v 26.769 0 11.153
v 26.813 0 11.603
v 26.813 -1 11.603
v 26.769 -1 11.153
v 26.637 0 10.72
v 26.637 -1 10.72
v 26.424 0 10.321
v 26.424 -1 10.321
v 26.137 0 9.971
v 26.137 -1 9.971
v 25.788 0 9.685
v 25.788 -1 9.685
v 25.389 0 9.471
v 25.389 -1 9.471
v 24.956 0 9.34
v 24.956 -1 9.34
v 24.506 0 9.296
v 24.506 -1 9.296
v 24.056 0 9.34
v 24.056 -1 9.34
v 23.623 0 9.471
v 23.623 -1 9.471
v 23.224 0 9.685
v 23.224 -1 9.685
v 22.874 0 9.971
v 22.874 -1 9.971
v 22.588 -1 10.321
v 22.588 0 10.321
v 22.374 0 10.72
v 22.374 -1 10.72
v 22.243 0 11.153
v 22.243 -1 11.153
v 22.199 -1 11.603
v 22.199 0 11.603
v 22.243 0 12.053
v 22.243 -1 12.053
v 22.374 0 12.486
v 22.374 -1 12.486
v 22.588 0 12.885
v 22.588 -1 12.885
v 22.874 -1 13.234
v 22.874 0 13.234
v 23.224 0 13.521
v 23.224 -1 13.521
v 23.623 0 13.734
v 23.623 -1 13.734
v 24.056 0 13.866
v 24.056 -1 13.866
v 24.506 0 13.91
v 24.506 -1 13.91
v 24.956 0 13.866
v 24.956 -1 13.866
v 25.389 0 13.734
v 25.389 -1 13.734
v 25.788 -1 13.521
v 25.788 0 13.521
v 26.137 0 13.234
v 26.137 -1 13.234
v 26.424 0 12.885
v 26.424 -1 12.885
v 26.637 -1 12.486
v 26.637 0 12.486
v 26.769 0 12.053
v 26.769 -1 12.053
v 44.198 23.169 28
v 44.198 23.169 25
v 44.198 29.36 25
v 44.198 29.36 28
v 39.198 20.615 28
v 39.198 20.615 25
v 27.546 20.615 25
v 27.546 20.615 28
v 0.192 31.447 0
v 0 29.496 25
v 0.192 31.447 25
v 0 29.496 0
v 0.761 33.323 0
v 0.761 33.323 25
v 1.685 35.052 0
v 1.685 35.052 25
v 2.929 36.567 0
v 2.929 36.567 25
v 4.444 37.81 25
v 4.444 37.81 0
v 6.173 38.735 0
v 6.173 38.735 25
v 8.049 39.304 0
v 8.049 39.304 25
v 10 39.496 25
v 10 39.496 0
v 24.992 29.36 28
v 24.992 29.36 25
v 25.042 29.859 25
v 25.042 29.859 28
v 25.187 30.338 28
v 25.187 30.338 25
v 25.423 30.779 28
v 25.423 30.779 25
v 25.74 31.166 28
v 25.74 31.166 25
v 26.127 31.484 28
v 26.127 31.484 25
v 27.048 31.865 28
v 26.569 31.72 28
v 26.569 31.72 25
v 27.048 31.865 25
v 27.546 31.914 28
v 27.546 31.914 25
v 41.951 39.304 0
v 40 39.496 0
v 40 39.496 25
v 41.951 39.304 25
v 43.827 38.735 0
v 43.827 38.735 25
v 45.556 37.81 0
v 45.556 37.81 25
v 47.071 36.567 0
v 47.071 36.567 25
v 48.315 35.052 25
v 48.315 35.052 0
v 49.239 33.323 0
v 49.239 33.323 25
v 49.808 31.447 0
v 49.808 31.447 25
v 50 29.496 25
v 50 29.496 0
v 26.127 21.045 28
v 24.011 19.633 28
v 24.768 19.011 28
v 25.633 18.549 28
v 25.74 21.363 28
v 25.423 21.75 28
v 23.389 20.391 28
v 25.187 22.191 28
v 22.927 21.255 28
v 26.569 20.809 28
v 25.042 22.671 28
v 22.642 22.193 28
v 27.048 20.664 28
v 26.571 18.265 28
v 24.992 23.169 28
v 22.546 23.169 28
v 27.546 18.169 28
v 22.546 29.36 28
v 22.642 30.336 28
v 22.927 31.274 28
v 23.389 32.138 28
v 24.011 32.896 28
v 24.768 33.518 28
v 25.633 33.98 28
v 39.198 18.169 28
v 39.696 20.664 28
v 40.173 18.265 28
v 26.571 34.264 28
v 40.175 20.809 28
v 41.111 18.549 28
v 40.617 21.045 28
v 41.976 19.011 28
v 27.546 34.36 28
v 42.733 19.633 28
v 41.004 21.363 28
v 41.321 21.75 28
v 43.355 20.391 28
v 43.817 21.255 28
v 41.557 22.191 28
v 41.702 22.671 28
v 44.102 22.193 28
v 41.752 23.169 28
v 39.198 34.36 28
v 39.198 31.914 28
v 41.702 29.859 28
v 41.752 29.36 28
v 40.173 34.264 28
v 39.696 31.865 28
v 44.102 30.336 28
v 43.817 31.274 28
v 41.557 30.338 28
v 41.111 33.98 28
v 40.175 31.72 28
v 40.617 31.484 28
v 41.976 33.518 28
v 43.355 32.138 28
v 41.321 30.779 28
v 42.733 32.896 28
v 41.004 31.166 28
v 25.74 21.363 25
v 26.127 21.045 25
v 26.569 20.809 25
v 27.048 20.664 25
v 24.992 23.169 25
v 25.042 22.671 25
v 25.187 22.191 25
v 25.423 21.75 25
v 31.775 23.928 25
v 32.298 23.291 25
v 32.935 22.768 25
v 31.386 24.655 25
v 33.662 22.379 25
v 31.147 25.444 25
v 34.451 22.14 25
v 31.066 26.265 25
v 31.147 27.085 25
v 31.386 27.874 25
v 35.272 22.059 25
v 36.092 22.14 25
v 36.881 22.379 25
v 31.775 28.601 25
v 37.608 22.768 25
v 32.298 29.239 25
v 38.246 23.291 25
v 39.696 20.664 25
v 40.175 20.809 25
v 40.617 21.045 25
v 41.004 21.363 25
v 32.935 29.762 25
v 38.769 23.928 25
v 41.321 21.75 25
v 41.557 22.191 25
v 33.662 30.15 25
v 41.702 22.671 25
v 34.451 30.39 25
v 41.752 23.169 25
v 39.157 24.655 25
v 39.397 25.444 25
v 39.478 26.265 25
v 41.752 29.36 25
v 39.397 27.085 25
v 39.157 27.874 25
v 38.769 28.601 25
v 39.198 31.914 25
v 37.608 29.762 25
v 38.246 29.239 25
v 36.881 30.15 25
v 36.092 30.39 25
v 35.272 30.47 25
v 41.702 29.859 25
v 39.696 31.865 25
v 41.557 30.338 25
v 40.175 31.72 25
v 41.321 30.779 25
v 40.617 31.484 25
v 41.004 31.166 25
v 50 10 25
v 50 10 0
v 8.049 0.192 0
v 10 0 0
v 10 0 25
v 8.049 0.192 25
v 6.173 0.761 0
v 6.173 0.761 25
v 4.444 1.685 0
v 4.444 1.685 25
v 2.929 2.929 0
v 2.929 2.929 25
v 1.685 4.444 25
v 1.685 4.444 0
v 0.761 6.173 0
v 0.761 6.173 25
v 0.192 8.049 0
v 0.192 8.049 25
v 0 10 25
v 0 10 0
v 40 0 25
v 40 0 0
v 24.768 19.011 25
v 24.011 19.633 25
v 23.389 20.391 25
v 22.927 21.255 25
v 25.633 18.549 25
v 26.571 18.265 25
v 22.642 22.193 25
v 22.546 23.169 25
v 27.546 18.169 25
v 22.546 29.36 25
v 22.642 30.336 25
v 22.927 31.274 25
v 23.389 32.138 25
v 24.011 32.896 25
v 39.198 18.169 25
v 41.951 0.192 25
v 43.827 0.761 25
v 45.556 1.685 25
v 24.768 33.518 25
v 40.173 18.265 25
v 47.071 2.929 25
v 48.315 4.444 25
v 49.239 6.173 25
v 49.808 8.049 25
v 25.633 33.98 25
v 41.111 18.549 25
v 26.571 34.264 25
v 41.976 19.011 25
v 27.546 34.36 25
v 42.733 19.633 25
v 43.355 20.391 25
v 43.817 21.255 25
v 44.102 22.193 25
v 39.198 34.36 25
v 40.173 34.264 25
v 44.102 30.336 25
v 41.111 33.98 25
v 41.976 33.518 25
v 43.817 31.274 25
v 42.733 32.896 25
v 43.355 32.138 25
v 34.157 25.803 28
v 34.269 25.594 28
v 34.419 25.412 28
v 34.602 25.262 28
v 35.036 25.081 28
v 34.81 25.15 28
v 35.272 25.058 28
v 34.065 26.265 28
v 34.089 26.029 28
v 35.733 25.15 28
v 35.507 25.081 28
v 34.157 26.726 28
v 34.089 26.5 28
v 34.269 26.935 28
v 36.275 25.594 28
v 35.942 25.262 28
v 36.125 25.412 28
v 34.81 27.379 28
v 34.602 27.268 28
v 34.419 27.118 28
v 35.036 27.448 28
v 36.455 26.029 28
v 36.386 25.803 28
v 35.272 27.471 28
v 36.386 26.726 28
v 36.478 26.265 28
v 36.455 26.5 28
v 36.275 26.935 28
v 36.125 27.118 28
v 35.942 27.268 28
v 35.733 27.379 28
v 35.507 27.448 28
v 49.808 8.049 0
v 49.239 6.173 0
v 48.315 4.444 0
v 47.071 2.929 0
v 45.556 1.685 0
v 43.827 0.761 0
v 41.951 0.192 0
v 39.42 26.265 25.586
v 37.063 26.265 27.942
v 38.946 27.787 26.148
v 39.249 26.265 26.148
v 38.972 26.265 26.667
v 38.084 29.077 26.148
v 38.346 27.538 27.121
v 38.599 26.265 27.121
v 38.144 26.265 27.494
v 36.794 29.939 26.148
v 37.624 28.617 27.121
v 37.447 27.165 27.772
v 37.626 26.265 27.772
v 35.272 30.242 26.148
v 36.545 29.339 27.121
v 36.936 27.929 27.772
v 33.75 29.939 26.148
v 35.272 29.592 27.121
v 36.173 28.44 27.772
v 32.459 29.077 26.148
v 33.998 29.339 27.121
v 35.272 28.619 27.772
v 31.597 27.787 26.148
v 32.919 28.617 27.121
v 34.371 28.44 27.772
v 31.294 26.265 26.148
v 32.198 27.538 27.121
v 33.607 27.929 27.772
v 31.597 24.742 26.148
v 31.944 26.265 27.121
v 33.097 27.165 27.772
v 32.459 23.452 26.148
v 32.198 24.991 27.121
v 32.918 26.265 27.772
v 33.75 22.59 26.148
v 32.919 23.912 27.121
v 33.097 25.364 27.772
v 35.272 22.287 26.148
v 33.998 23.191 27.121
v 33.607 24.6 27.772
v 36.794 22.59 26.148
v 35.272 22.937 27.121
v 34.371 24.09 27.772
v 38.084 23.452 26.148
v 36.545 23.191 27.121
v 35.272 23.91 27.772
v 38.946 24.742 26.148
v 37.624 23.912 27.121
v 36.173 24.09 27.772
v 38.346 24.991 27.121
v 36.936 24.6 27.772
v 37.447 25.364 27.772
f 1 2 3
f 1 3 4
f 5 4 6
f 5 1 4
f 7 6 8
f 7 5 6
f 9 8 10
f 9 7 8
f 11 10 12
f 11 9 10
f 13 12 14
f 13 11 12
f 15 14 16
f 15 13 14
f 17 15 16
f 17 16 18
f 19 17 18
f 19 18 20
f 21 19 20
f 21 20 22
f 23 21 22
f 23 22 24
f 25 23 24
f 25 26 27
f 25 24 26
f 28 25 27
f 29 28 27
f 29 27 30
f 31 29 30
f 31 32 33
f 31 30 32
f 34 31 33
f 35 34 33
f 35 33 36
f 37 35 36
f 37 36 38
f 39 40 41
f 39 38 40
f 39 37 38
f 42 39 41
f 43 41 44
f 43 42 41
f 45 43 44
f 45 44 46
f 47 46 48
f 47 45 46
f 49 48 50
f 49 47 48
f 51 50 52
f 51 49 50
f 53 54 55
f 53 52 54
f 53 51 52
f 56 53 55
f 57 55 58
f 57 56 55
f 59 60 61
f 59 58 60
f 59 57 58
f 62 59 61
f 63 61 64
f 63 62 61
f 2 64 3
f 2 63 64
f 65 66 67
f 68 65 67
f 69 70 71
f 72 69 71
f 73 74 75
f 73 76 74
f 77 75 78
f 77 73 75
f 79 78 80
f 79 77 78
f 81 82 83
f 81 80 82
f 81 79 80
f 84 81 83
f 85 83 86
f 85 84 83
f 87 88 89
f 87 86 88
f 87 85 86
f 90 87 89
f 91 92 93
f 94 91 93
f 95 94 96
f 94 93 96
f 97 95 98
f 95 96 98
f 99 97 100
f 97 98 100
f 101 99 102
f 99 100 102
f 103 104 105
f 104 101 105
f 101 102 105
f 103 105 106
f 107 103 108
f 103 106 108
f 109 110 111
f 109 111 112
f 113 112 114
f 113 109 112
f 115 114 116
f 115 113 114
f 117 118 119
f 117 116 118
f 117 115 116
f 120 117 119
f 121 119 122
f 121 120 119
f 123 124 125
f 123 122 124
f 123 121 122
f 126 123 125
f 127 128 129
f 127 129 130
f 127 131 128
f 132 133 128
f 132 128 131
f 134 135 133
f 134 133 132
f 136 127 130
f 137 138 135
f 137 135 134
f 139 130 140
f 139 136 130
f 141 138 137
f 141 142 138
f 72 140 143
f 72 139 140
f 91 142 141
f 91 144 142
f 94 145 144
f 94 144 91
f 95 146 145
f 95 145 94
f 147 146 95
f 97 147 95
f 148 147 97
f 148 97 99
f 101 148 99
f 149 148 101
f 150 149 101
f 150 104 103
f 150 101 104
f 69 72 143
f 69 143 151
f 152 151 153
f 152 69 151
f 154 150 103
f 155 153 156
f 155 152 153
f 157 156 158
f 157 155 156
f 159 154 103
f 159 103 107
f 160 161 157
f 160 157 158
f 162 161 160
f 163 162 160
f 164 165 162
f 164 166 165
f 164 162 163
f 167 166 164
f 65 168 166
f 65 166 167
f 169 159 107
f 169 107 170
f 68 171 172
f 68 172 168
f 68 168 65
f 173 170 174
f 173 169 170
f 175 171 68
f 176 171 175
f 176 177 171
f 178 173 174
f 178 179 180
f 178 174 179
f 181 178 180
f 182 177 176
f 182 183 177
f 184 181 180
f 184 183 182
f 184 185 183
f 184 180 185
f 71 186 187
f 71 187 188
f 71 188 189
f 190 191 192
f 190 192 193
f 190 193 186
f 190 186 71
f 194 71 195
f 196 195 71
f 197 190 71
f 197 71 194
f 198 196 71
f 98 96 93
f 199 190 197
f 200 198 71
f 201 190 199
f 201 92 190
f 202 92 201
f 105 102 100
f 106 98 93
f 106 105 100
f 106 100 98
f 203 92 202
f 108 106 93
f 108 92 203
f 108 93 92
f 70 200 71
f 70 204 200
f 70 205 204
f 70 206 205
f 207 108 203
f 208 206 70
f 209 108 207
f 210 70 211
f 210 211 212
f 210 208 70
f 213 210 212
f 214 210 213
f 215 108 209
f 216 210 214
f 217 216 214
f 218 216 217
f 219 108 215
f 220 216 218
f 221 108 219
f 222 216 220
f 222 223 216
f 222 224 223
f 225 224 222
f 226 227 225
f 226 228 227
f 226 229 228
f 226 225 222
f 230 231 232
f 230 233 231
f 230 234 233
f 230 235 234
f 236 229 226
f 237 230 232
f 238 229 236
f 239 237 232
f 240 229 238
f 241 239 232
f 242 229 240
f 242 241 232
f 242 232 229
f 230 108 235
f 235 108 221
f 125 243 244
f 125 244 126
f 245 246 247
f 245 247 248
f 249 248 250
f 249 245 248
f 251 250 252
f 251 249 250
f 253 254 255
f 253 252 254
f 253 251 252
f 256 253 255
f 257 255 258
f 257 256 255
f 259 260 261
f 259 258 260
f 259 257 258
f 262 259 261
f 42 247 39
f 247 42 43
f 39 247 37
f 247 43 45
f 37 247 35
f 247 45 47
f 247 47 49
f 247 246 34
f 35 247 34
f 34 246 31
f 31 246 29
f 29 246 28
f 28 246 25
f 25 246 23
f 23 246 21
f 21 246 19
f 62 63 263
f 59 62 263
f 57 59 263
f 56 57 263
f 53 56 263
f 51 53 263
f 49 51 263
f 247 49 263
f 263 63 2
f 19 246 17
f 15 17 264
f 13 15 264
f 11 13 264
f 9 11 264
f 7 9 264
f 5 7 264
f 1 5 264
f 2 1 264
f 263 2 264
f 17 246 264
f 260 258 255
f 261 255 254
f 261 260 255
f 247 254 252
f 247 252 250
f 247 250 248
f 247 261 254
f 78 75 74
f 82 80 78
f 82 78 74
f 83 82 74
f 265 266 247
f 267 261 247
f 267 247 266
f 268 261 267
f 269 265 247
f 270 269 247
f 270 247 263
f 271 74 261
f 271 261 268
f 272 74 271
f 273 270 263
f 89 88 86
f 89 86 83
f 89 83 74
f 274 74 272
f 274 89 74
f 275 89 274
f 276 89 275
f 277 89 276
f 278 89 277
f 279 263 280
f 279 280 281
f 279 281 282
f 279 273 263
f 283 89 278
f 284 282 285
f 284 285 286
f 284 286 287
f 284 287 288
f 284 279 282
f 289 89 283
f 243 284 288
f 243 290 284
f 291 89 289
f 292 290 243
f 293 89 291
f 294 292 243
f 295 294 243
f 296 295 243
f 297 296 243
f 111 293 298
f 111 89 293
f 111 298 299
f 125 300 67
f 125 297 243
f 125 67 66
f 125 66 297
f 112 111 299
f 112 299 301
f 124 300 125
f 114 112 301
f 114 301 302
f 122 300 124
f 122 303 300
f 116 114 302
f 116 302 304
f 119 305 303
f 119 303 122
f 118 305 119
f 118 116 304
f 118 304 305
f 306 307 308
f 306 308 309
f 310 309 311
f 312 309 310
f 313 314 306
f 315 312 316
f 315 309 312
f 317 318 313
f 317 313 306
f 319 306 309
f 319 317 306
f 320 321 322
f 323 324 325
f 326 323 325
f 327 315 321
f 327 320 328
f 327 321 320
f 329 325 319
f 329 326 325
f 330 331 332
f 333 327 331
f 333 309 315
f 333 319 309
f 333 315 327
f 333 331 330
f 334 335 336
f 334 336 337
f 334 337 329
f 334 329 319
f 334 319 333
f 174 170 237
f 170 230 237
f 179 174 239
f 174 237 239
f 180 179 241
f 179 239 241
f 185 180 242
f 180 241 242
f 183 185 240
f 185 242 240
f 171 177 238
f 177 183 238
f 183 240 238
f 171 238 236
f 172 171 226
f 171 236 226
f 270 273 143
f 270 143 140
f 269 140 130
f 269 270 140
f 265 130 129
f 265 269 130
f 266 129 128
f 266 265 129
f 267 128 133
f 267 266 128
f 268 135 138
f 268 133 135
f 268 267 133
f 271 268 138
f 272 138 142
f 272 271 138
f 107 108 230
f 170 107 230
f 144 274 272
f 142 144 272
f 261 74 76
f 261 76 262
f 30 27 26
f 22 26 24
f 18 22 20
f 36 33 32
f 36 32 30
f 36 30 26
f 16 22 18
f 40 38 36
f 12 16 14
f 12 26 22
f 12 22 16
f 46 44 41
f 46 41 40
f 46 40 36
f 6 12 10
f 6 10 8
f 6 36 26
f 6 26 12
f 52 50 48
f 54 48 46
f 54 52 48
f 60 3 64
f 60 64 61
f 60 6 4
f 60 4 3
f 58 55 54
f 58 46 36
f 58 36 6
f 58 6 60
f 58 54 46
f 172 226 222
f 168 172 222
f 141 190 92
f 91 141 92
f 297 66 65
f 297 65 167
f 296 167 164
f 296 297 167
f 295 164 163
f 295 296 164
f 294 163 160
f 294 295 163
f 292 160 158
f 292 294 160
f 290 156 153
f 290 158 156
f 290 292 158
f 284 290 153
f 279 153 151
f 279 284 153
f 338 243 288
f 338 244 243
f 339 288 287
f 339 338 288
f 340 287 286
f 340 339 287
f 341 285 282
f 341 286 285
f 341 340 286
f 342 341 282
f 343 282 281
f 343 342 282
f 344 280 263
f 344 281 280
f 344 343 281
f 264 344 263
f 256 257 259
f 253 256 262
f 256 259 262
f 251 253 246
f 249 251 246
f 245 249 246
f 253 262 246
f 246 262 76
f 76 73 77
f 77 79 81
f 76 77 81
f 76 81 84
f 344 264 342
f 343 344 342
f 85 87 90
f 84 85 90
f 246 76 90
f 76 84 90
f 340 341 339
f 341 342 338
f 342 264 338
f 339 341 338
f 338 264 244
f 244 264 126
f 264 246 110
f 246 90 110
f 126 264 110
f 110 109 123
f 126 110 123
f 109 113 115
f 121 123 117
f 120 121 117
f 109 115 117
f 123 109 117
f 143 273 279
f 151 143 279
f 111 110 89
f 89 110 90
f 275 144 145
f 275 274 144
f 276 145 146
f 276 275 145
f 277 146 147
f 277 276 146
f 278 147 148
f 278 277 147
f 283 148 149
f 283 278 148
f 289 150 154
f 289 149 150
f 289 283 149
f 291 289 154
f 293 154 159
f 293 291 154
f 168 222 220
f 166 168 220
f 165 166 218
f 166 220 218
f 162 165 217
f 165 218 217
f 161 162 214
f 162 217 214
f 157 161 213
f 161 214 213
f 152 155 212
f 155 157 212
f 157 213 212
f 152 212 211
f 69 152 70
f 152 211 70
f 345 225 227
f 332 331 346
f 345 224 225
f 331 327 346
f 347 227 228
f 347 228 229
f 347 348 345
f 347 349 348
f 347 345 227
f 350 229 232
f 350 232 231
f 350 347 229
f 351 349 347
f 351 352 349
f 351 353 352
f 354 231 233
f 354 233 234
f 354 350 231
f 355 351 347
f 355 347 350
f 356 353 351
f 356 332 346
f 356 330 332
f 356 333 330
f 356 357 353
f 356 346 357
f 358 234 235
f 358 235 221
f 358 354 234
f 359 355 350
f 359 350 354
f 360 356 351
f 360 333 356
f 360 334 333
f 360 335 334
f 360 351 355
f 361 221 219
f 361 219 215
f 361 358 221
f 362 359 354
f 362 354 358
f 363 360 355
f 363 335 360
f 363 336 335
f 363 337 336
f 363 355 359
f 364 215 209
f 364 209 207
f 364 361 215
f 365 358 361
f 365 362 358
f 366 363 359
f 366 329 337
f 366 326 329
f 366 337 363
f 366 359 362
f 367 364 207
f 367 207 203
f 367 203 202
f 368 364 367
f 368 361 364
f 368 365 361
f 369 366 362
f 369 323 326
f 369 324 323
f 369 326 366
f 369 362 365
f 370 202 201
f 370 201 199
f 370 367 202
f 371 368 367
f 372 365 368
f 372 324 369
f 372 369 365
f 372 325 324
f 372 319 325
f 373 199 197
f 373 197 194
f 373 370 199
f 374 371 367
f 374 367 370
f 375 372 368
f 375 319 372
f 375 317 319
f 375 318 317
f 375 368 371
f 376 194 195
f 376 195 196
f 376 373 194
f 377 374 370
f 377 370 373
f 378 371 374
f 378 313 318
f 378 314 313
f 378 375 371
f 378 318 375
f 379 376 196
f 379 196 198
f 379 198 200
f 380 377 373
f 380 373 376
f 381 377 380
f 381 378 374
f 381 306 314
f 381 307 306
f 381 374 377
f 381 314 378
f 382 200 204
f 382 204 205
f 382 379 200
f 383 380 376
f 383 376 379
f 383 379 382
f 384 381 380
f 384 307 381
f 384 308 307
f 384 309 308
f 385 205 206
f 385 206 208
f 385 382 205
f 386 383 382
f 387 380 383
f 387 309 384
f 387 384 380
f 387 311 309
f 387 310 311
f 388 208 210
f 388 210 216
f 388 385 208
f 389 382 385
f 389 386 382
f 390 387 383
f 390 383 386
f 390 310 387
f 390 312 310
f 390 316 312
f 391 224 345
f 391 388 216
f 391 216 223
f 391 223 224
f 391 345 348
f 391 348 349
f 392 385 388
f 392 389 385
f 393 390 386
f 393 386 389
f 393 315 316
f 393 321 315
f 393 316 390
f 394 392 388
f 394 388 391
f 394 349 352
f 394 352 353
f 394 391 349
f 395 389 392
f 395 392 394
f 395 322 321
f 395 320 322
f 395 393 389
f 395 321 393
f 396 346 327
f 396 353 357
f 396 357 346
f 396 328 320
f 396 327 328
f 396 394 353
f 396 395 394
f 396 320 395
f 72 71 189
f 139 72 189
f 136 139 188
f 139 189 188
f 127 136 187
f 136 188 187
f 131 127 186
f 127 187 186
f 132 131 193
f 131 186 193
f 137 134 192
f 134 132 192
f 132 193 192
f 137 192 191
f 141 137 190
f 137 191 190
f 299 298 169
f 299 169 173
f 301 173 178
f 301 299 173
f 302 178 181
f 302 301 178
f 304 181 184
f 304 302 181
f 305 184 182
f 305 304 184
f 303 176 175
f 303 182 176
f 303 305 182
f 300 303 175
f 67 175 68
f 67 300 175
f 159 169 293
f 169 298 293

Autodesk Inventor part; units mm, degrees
ref_plane "YZ Plane" through (0, 0, 0) normal (1, 0, 0) x (0, 1, 0)
ref_plane "XZ Plane" through (0, 0, 0) normal (0, 1, 0) x (-1, 0, 0)
ref_plane "XY Plane" through (0, 0, 0) normal (0, 0, 1) x (1, 0, 0)
sketch "Sketch1" plane through (0, 0, 0) normal (0, 0, 1) x (1, 0, 0)
  line L0 (10, 0) -> (40, 0)
  line L1 (50, 10) -> (50, 29.4958)
  line L2 (40, 39.4958) -> (10, 39.4958)
  line L3 (0, 29.4958) -> (0, 10)
  arc A0 (10, 39.4958) -> (0, 29.4958) centre (10, 29.4958) ccw
  arc A1 (50, 29.4958) -> (40, 39.4958) centre (40, 29.4958) ccw
  arc A2 (40, 0) -> (50, 10) centre (40, 10) ccw
  arc A3 (0, 10) -> (10, 0) centre (10, 10) ccw
  point P0 (0, 0)
  point P1 (50, 39.4958)
  point P2 (0, 39.4958)
  dimension "d0" = 50
  dimension "d1" = 10
extrude "Extrusion1" add sketch "Sketch1" along normal blind 25
sketch "Sketch2" plane through (0, 0, 25) normal (0, 0, 1) x (1, 0, 0)
  line L0 (39.1979, 34.3605) -> (27.5461, 34.3605)
  line L1 (22.5461, 29.3605) -> (22.5461, 23.1687)
  line L2 (27.5461, 18.1687) -> (39.1979, 18.1687)
  line L3 (44.1979, 23.1687) -> (44.1979, 29.3605)
  arc A0 (27.5461, 34.3605) -> (22.5461, 29.3605) centre (27.5461, 29.3605) ccw
  arc A1 (44.1979, 29.3605) -> (39.1979, 34.3605) centre (39.1979, 29.3605) ccw
  arc A2 (39.1979, 18.1687) -> (44.1979, 23.1687) centre (39.1979, 23.1687) ccw
  arc A3 (22.5461, 23.1687) -> (27.5461, 18.1687) centre (27.5461, 23.1687) ccw
  line L4 (27.5461, 31.9141) -> (39.1979, 31.9141)
  arc A4 (41.7515, 29.3605) -> (39.1979, 31.9141) centre (39.1979, 29.3605) ccw
  line L5 (41.7515, 29.3605) -> (41.7515, 23.1687)
  arc A5 (39.1979, 20.6151) -> (41.7515, 23.1687) centre (39.1979, 23.1687) ccw
  line L6 (39.1979, 20.6151) -> (27.5461, 20.6151)
  arc A6 (24.9925, 23.1687) -> (27.5461, 20.6151) centre (27.5461, 23.1687) ccw
  line L7 (24.9925, 23.1687) -> (24.9925, 29.3605)
  arc A7 (27.5461, 31.9141) -> (24.9925, 29.3605) centre (27.5461, 29.3605) ccw
  circle A8 centre (35.2717, 26.2646) radius 4.2058
  point P0 (0, 0)
  dimension "d4" = 5
extrude "Extrusion2" add sketch "Sketch2" along normal blind 3
fillet "Fillet1" radius 3 1 edges at (31.0659, 26.2646, 28)
sketch "Sketch3" plane through (10, 0, 0) normal (0, -1, 0) x (1, 0, 0)
  circle A0 centre (14.5059, 11.6029) radius 2.3072
  point P0 (-10, 0)
extrude "Extrusion3" add sketch "Sketch3" along normal blind 1
properties part number "temp camera" material "Rubber"
